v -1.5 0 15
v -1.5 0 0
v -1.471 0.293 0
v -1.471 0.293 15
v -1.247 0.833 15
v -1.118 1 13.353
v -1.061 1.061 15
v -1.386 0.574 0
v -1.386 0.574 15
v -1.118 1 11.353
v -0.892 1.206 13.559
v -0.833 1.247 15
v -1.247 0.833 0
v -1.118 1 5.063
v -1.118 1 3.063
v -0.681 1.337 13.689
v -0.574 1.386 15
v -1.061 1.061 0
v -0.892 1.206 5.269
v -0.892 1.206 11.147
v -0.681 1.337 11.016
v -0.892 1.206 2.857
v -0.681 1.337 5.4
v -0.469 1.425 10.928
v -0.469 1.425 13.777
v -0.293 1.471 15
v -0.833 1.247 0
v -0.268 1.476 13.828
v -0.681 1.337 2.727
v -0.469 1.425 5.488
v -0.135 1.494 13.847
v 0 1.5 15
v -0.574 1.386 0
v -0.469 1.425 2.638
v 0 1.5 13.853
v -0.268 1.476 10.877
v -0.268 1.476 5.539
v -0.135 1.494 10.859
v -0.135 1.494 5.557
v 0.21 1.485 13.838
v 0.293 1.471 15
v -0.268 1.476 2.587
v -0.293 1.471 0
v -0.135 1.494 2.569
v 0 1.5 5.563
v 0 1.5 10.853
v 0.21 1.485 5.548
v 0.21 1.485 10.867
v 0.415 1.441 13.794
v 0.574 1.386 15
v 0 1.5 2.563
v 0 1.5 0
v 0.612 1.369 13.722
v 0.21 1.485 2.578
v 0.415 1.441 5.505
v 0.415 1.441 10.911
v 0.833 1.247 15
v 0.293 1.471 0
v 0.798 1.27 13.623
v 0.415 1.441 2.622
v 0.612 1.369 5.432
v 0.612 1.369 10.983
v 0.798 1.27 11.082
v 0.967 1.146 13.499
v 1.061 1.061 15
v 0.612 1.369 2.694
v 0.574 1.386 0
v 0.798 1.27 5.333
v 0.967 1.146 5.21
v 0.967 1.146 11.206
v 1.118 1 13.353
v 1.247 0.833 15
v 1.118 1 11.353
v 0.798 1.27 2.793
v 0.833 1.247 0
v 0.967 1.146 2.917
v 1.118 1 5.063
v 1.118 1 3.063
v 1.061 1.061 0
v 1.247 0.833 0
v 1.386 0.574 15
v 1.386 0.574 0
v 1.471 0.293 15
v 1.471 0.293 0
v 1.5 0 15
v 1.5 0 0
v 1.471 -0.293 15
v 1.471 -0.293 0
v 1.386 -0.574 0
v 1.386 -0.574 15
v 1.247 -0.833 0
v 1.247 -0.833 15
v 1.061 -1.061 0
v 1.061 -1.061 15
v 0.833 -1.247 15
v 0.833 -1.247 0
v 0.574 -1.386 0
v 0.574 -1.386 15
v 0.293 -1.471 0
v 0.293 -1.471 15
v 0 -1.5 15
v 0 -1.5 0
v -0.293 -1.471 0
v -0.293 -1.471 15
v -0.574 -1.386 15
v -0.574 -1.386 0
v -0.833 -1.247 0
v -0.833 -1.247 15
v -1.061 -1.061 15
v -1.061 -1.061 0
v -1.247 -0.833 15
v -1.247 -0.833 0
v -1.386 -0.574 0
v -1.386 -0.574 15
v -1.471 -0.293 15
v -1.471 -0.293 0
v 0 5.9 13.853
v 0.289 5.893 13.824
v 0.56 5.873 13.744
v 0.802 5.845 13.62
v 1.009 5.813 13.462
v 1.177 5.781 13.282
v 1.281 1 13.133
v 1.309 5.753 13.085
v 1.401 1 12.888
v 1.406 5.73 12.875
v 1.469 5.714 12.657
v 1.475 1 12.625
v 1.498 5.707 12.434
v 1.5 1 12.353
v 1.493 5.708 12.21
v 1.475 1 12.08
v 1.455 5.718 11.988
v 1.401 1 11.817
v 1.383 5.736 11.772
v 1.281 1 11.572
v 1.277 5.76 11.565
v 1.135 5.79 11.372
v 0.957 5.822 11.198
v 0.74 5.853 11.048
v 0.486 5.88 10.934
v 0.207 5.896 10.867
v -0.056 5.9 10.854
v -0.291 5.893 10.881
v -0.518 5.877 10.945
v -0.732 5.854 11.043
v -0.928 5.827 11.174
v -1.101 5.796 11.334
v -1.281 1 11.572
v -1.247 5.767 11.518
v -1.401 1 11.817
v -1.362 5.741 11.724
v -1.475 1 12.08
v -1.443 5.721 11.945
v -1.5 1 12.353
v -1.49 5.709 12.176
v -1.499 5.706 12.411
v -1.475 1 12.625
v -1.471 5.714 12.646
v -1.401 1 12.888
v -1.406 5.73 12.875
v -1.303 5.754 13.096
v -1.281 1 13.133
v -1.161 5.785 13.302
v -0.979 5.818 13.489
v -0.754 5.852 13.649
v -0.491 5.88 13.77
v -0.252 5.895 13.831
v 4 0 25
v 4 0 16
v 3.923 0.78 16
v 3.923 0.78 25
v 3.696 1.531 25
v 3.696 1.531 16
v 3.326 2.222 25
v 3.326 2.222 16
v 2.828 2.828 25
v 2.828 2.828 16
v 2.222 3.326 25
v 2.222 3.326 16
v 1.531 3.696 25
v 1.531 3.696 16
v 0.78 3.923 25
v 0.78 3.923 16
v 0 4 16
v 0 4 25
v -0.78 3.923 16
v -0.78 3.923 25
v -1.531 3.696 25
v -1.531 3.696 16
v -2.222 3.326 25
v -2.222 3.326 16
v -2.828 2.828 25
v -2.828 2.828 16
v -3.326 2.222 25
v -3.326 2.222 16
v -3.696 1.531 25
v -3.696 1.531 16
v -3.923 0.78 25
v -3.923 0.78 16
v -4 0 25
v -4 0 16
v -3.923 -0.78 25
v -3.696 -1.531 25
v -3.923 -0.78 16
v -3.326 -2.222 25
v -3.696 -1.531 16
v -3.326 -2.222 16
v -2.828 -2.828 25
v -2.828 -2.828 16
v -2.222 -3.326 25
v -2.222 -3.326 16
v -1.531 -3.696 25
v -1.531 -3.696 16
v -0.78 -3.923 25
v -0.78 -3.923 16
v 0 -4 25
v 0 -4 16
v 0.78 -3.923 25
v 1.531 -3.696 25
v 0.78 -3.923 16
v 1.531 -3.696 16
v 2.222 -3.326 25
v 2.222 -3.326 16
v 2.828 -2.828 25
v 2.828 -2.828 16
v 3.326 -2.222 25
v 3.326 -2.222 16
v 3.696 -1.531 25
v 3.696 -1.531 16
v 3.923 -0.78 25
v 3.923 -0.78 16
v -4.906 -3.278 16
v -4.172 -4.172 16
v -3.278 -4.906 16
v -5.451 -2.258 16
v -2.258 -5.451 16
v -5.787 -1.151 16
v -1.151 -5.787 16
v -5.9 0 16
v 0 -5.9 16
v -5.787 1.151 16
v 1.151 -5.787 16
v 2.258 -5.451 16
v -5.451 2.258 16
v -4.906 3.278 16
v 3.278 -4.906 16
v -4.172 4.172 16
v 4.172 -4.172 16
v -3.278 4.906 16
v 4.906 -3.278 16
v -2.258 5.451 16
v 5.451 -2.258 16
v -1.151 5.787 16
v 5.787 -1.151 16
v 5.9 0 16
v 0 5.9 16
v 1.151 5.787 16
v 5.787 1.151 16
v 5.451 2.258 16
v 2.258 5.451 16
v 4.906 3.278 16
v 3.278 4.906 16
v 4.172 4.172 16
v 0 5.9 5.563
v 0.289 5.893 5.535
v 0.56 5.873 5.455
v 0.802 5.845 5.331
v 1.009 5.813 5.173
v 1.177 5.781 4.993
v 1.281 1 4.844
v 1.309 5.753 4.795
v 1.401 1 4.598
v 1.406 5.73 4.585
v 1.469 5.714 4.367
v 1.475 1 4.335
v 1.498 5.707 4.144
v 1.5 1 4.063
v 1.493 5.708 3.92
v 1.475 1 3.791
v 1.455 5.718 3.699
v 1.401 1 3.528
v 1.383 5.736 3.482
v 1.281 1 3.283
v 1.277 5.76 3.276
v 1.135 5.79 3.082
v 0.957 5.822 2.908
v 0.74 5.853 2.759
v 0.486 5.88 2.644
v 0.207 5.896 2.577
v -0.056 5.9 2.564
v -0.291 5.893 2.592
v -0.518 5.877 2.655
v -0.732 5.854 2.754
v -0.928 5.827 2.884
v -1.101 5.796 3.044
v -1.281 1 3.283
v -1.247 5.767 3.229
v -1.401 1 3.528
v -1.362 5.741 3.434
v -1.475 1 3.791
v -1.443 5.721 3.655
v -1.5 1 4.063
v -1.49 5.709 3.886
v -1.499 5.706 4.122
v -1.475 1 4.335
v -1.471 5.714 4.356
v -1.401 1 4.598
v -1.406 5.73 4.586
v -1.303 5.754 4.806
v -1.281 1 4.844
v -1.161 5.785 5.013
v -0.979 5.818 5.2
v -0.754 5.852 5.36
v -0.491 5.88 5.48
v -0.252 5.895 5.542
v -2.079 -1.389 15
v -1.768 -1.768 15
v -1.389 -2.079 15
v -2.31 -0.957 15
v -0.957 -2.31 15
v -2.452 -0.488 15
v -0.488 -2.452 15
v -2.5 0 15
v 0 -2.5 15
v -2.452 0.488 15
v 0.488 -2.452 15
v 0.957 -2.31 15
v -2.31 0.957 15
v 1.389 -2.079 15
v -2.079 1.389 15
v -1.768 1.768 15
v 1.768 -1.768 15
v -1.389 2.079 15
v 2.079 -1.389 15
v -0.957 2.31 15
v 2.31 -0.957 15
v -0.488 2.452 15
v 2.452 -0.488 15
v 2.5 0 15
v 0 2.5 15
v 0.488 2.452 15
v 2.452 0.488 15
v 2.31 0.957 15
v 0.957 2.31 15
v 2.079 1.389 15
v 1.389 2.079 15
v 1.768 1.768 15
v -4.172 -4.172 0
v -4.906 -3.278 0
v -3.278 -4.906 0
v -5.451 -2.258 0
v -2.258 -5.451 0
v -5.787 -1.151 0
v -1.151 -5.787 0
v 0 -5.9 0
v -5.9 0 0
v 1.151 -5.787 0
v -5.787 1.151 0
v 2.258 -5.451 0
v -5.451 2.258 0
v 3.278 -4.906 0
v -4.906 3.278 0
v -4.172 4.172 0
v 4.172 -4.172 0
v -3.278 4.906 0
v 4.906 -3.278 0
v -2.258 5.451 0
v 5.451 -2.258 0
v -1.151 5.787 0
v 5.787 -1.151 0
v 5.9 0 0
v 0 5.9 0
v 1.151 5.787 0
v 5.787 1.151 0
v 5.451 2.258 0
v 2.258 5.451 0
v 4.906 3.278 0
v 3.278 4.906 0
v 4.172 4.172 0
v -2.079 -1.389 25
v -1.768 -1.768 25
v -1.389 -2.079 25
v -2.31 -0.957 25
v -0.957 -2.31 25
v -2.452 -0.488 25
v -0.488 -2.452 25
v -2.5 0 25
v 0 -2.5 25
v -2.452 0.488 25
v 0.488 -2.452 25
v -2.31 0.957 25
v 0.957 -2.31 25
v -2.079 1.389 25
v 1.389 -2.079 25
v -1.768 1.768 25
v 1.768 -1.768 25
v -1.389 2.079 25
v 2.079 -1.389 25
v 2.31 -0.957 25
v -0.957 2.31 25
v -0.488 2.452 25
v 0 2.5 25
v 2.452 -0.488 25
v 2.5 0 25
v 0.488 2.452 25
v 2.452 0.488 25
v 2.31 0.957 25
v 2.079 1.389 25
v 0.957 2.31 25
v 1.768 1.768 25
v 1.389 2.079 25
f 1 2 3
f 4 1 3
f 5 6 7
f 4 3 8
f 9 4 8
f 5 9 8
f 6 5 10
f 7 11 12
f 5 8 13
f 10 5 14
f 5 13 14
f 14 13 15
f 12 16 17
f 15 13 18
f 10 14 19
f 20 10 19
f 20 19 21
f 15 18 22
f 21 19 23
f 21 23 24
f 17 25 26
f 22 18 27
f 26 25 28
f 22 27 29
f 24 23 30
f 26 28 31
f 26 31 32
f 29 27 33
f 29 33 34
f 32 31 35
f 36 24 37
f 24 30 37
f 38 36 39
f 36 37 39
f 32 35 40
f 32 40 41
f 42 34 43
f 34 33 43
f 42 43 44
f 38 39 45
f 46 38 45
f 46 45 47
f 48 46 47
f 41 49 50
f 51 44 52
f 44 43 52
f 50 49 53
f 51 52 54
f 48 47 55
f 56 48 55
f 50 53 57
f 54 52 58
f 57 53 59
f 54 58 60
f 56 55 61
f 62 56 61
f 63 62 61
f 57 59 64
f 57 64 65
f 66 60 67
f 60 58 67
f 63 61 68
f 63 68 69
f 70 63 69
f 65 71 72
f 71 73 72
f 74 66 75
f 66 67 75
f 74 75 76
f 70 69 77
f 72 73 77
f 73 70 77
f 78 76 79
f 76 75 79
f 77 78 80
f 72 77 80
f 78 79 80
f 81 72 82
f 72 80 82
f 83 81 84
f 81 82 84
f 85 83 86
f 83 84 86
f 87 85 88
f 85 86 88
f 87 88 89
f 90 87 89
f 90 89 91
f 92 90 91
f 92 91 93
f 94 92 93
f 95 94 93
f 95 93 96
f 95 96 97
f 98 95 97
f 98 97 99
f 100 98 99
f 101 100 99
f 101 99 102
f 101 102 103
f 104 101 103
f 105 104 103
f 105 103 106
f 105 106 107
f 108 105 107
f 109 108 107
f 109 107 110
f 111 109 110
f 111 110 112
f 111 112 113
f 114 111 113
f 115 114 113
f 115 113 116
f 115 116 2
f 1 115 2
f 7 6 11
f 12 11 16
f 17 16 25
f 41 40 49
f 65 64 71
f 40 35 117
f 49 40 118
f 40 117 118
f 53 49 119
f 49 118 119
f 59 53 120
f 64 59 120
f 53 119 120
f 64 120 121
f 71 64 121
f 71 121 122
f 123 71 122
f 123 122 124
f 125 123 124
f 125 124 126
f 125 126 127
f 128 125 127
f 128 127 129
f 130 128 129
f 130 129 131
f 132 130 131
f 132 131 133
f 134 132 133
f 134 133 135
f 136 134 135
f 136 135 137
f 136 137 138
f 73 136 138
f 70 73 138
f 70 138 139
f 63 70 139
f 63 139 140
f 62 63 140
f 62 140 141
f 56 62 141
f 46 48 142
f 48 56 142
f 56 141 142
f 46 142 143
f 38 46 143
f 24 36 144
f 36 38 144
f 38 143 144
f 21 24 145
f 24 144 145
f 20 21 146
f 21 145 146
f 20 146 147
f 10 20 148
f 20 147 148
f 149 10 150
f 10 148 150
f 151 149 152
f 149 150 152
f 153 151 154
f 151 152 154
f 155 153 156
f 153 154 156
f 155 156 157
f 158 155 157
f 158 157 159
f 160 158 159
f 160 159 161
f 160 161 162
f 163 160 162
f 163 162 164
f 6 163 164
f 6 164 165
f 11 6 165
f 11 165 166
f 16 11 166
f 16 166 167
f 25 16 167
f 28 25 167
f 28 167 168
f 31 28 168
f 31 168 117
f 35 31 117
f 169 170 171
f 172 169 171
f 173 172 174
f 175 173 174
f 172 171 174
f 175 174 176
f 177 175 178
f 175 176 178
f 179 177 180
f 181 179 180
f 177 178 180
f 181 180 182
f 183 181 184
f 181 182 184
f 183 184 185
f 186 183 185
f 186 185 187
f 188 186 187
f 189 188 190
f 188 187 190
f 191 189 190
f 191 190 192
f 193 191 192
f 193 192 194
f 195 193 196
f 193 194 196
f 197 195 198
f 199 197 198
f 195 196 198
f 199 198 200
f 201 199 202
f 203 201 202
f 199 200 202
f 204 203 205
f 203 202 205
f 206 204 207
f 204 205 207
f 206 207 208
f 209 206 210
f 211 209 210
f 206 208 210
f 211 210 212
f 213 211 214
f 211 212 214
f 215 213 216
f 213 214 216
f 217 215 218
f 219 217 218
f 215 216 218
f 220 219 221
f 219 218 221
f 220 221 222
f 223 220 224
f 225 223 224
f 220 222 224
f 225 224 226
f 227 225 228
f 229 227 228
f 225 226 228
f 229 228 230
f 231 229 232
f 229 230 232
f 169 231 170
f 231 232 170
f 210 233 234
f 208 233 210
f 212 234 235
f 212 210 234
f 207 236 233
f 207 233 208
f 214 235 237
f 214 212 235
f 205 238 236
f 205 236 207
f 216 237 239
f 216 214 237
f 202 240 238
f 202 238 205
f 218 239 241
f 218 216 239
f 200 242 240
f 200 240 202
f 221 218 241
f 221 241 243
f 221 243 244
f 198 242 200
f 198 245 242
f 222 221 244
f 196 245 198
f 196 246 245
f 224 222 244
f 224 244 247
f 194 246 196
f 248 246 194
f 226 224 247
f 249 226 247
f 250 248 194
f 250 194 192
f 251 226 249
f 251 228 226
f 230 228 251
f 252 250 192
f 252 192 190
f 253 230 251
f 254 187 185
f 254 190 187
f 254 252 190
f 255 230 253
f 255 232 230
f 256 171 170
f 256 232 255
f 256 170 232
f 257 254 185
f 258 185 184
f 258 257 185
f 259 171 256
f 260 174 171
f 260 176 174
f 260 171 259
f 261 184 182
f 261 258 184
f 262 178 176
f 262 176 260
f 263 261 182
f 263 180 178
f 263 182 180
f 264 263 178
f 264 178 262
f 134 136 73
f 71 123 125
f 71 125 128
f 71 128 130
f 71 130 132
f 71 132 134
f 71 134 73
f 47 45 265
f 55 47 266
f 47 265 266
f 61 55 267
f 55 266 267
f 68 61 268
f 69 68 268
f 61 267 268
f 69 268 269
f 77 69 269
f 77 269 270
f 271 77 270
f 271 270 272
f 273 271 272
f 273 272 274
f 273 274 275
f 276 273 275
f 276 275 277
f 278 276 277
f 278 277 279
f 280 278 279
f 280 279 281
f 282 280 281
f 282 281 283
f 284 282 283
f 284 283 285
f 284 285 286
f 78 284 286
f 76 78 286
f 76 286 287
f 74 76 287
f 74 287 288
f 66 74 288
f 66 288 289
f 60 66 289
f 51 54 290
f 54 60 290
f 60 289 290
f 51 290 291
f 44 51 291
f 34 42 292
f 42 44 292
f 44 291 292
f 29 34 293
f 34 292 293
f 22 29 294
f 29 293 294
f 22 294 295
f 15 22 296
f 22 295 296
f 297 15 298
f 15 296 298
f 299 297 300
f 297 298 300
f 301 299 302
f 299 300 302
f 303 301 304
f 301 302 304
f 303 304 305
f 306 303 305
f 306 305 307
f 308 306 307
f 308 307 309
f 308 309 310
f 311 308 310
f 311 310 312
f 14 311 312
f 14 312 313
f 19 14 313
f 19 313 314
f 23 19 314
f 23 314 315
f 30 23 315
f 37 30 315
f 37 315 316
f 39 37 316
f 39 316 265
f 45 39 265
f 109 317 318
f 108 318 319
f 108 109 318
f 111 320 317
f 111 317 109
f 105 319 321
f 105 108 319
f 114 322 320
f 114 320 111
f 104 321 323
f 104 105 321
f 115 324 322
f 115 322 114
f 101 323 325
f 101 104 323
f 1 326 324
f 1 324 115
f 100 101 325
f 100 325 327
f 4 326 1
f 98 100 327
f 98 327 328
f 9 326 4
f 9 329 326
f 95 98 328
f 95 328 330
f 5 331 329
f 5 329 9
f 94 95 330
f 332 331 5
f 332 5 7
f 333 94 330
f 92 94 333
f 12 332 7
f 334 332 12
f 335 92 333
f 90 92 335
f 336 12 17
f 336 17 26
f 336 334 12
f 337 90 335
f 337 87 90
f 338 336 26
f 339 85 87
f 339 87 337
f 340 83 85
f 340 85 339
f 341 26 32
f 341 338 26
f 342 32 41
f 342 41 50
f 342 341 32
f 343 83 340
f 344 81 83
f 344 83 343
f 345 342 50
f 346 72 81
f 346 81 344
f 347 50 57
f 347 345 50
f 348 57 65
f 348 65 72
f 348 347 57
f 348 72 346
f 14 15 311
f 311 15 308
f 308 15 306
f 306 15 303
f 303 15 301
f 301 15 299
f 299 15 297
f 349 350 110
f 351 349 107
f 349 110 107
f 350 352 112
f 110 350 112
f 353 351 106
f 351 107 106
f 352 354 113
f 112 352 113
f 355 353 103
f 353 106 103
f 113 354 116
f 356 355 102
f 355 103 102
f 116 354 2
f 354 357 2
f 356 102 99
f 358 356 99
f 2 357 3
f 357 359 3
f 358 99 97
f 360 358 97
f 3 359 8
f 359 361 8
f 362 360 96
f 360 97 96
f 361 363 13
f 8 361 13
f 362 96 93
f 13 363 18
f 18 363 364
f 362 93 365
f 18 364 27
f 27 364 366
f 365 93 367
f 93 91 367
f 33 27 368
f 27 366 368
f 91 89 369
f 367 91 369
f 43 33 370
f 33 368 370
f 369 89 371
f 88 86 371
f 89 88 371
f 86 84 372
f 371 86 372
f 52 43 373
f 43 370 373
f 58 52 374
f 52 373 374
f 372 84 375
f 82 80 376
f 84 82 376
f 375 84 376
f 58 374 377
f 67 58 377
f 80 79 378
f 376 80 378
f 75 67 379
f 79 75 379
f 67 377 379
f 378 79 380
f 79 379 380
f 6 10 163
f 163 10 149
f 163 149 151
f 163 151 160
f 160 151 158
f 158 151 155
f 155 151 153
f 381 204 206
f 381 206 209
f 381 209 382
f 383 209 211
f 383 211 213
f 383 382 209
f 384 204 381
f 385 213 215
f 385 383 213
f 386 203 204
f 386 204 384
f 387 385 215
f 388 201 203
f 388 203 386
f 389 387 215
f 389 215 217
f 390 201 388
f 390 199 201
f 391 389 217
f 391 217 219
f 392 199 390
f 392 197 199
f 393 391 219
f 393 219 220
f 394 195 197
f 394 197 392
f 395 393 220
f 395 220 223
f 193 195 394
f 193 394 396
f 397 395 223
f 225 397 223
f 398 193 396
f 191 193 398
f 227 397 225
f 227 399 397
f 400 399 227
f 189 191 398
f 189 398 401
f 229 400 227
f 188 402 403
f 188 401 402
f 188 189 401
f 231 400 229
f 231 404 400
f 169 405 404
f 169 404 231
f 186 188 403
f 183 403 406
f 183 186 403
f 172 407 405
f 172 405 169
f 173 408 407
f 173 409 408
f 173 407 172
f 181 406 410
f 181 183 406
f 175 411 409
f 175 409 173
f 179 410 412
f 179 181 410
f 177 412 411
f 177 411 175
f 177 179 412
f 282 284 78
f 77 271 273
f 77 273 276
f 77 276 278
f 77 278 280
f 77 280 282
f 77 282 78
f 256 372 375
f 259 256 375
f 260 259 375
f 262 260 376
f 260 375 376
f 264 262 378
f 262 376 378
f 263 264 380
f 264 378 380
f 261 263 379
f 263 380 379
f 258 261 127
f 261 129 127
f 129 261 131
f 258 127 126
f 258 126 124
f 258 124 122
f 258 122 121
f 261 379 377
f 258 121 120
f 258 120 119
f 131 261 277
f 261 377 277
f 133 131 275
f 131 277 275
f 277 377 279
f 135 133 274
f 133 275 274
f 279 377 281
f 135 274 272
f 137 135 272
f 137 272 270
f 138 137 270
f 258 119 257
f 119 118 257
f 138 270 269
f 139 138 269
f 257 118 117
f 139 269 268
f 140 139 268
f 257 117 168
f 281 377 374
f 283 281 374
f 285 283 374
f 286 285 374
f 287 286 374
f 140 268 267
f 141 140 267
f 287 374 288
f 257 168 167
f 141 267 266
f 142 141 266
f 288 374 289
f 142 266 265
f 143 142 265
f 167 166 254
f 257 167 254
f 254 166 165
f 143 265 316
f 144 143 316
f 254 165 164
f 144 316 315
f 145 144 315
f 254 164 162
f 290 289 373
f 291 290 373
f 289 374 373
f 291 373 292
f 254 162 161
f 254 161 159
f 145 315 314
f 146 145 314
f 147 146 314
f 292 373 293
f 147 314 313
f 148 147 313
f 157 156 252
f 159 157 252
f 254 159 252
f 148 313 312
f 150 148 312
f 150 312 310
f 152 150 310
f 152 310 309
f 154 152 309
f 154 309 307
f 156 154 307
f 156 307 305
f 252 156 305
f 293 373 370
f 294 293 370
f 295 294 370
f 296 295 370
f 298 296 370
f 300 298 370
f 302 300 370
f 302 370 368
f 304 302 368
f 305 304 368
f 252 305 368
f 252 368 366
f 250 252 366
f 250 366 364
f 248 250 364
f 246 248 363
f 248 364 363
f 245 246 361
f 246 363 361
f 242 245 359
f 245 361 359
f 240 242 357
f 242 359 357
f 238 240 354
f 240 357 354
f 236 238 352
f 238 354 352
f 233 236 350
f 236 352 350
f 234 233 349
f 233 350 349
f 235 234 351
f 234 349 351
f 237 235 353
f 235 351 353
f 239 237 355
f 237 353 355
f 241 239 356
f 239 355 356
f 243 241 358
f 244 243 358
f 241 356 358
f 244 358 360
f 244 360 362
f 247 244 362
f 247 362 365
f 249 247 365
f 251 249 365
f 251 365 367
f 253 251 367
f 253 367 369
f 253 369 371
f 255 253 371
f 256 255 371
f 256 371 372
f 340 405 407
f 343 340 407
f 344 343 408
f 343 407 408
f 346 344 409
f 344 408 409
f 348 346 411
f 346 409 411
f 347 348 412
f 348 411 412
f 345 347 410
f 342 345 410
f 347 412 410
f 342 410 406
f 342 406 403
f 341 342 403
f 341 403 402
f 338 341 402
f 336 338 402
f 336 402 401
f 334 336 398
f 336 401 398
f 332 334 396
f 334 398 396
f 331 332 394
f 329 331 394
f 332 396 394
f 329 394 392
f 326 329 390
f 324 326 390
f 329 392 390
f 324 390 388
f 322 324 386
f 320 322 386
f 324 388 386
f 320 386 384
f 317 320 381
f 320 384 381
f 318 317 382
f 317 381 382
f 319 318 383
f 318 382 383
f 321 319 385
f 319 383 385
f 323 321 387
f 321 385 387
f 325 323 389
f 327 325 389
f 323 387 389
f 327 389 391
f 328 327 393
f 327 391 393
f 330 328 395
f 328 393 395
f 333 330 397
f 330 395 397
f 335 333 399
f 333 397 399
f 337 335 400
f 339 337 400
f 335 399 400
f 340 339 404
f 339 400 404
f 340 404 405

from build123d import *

# Parameters (mm, degrees)
SKETCH_1_R          = 5.9
EXTRUDE_1_DEPTH     = 25
SKETCH_2_R          = 2.5
CUT_EXTRUDE_2_DEPTH = 10
SKETCH_3_R          = 1.5
CUT_EXTRUDE_3_DEPTH = 15
SKETCH_5_R          = 1.5
CUT_EXTRUDE_4_DEPTH = 6
CUT_EXTRUDE_START   = -9
SKETCH_6_R          = 5.9
SKETCH_6_R_2        = 4
CUT_EXTRUDE_5_DEPTH = 9


with BuildPart() as part:
    # Эскиз1 → Вытянуть1 (new body)
    with BuildSketch(Plane.XY):
        Circle(SKETCH_1_R)
    extrude(amount=EXTRUDE_1_DEPTH)

    # Эскиз2 → Вытянуть2 (cut)
    with BuildSketch(Plane.XY.offset(25)):
        Circle(SKETCH_2_R)
    extrude(amount=-CUT_EXTRUDE_2_DEPTH, mode=Mode.SUBTRACT)

    # Эскиз3 → Вытянуть3 (cut)
    with BuildSketch(Plane(origin=(0, 0, 0), x_dir=(-1, 0, 0), z_dir=(0, 0, -1))):
        Circle(SKETCH_3_R)
    extrude(amount=-CUT_EXTRUDE_3_DEPTH, mode=Mode.SUBTRACT)

    # Эскиз5 → Вытянуть4 (cut)
    with BuildSketch(Plane(origin=(0, 7, 0), x_dir=(-1, 0, 0), z_dir=(0, 1, 0))):
        with Locations(Location((0, 4.063182322, 0), (0, 0, 90))):
            Circle(SKETCH_5_R)
        with Locations(Location((0, 12.352632006, 0), (0, 0, 90))):
            Circle(SKETCH_5_R)
    extrude(amount=-CUT_EXTRUDE_4_DEPTH, mode=Mode.SUBTRACT)

    # Эскиз6 → Вытянуть5 (cut)
    with BuildSketch(Plane.XY.offset(25).offset(CUT_EXTRUDE_START)):
        Circle(SKETCH_6_R)
        Circle(SKETCH_6_R_2, mode=Mode.SUBTRACT)
    extrude(amount=CUT_EXTRUDE_5_DEPTH, mode=Mode.SUBTRACT)


solid = part.part
